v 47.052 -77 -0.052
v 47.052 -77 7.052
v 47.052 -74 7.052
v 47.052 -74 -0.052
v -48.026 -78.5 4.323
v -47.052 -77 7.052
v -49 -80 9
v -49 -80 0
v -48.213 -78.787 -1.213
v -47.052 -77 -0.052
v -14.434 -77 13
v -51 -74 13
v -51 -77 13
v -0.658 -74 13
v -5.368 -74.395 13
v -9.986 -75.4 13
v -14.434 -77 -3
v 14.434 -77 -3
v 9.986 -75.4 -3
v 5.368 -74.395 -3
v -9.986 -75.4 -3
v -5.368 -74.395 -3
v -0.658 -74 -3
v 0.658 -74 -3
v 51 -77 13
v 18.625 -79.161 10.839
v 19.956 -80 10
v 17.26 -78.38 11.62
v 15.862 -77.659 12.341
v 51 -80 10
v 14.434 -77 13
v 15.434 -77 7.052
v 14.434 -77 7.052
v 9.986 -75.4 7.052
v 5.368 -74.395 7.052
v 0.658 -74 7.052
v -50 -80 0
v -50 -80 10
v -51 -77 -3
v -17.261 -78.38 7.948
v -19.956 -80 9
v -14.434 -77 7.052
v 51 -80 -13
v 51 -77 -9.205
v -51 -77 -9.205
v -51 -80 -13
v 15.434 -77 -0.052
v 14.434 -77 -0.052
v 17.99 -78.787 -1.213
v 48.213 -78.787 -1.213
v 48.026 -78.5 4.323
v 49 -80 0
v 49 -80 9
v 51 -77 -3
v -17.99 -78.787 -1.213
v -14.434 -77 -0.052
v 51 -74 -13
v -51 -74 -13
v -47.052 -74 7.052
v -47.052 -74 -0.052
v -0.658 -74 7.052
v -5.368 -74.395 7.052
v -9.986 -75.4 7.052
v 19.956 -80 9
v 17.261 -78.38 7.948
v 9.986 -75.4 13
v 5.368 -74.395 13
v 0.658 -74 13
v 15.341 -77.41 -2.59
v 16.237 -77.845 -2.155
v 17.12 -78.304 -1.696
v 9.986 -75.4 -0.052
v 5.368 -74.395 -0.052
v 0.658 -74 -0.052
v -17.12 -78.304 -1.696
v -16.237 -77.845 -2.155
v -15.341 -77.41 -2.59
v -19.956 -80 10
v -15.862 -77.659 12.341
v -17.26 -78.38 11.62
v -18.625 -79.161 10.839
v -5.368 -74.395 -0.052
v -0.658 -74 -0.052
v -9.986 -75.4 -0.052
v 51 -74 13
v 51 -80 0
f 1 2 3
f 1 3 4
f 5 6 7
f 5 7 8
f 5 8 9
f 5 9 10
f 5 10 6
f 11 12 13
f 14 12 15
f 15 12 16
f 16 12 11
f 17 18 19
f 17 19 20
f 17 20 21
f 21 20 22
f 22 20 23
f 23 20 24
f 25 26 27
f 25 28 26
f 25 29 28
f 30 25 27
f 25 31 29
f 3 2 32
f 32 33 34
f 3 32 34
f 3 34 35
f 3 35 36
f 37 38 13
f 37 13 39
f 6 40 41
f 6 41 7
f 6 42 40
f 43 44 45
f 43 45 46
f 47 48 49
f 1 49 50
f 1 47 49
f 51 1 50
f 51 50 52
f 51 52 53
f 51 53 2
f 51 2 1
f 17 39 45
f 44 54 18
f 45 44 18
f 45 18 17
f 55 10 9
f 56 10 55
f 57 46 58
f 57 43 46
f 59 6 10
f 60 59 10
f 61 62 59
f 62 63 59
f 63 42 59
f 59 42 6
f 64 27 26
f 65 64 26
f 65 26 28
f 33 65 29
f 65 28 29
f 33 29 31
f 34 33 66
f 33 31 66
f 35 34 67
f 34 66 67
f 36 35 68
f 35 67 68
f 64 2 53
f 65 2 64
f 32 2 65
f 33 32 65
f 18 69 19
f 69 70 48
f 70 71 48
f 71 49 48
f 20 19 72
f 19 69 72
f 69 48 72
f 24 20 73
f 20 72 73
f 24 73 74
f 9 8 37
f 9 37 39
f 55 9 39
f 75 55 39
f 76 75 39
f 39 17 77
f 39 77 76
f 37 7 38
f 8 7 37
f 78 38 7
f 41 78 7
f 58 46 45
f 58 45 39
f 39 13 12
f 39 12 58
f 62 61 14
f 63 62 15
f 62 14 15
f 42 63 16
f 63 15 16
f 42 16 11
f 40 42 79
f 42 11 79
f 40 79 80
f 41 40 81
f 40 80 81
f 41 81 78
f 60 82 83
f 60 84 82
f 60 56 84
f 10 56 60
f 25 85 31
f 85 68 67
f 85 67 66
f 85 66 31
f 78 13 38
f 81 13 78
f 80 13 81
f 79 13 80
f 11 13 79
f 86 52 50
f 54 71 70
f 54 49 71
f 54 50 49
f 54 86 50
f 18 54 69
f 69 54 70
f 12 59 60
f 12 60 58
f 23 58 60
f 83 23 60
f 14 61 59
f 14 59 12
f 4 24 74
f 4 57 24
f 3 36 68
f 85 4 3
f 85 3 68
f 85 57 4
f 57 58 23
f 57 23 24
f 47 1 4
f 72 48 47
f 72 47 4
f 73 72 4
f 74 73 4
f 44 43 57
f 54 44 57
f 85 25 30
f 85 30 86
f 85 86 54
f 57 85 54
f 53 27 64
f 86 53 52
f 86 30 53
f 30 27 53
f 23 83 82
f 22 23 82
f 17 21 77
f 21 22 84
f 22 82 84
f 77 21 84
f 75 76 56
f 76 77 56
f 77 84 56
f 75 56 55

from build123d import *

# Parameters (mm, degrees)
PAD005_DEPTH       = 51
SKETCH018_W        = 11
SKETCH018_H        = 98
POCKET008_DEPTH    = 3
POCKET008_TAPER    = 33
SKETCH019_R        = 36.155756
POCKET009_DEPTH    = 16
CHAMFER003_SIZE2   = 1
CHAMFER003_SIZE    = 3
CHAMFER004_SIZE2   = 1
CHAMFER004_SIZE    = 3
POCKET008_FACE15_W = 94.103554
POCKET008_FACE15_H = 7.103554
POCKET010_DEPTH    = 5


with BuildPart() as part:
    # Sketch017 → Pad005 (new body, symmetric)
    with BuildSketch(Plane.YZ):
        Polygon((-74, 13), (-77, 13), (-80, 10), (-80, 8), (-80, 7.369175), (-80, 2.369175), (-80, 1), (-80, 0), (-77, -3), (-77, -9.20497), (-80, -13), (-74, -13), align=None)
    extrude(amount=PAD005_DEPTH, both=True)

    # Sketch018 (on Face10 of Pad005) → Pocket008 (cut)
    with BuildSketch(Plane(origin=(0, -80, 0), x_dir=(0, 0, -1), z_dir=(0, -1, 0))):
        with Locations((-3.5, 0)):
            Rectangle(SKETCH018_W, SKETCH018_H)
    extrude(amount=-POCKET008_DEPTH, taper=POCKET008_TAPER, mode=Mode.SUBTRACT)

    # Sketch019 (on Face9 of Pocket008) → Pocket009 (cut)
    with BuildSketch(Plane(origin=(0, 0, 13), x_dir=(0, -1, 0), z_dir=(0, 0, 1))):
        with Locations((110.149765, 0)):
            Circle(SKETCH019_R)
    extrude(amount=-POCKET009_DEPTH, mode=Mode.SUBTRACT)

    # Chamfer003
    chamfer003_edges = [part.edges().sort_by_distance(p)[0] for p in [
        (14.433704, -77, 3.5),
    ]]
    chamfer003_side = part.faces().sort_by_distance((10.734675, -75.624333, 5))[0]
    chamfer(chamfer003_edges, length=CHAMFER003_SIZE, length2=CHAMFER003_SIZE2, reference=chamfer003_side)

    # Chamfer004
    chamfer004_edges = [part.edges().sort_by_distance(p)[0] for p in [
        (-51, -80, 5),
    ]]
    chamfer004_side = part.faces().sort_by_distance((-51, -76.532918, 1.044872))[0]
    chamfer(chamfer004_edges, length=CHAMFER004_SIZE, length2=CHAMFER004_SIZE2, reference=chamfer004_side)

    # Pocket008 Face15 → Pocket010 (cut)
    with BuildSketch(Plane(origin=(0, -77, 3.5), x_dir=(-1, 0, 0), z_dir=(0, -1, 0))):
        Rectangle(POCKET008_FACE15_W, POCKET008_FACE15_H)
    extrude(amount=-POCKET010_DEPTH, mode=Mode.SUBTRACT)


solid = part.part
